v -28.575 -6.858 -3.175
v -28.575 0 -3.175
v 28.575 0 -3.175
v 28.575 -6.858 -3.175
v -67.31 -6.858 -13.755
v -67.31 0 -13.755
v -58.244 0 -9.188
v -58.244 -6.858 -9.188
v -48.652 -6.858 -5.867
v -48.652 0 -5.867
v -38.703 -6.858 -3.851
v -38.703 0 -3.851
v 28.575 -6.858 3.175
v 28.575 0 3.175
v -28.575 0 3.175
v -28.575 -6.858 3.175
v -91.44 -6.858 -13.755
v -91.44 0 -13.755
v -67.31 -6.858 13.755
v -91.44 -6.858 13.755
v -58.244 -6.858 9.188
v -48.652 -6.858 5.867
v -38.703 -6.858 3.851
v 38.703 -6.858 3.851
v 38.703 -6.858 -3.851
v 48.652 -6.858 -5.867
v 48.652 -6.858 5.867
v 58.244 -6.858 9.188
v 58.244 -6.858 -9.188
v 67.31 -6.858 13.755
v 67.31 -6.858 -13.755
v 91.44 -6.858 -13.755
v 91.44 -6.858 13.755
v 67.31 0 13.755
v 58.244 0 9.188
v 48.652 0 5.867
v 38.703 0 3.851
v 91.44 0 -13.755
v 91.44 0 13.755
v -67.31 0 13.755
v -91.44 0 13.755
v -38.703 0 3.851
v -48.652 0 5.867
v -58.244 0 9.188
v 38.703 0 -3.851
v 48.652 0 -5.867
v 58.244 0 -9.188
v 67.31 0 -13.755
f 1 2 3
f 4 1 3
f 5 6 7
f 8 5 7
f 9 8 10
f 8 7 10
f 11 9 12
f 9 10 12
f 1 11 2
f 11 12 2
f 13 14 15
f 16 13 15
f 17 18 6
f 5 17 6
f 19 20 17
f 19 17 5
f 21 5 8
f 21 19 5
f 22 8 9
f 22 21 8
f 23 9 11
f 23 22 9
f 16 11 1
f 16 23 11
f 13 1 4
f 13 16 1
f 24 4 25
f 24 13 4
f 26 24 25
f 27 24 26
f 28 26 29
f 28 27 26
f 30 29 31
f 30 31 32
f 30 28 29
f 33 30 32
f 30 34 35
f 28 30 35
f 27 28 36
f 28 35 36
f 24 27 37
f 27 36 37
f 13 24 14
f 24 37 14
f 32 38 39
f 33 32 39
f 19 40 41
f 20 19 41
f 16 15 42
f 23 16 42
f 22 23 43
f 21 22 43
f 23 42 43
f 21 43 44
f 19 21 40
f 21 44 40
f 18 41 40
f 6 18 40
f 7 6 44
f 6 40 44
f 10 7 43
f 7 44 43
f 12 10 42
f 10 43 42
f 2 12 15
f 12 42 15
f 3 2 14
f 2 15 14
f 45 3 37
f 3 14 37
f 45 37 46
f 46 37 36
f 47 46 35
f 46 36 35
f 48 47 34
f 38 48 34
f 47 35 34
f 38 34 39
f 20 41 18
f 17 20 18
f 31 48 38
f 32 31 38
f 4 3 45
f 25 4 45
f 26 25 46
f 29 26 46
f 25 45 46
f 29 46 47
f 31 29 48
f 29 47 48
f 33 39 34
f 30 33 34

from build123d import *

# Parameters (mm, degrees)
F1_DEPTH = 6.858


with BuildPart() as f1:
    # F0 (on Front) → F1 (new body)
    with BuildSketch(Plane.XZ):
        with BuildLine():
            Line((28.575, 3.175), (0, 3.175))
            Line((0, 3.175), (-28.575, 3.175))
            ThreePointArc((-28.575, 3.175), (-48.6519, 5.867462), (-67.31, 13.754578))
            Line((-67.31, 13.754578), (-91.44, 13.754578))
            Line((-91.44, 13.754578), (-91.44, -13.754578))
            Line((-91.44, -13.754578), (-67.31, -13.754578))
            ThreePointArc((-67.31, -13.754578), (-48.6519, -5.867462), (-28.575, -3.175))
            Line((-28.575, -3.175), (0, -3.175))
            Line((0, -3.175), (28.575, -3.175))
            ThreePointArc((28.575, -3.175), (48.6519, -5.867462), (67.31, -13.754578))
            Line((67.31, -13.754578), (91.44, -13.754578))
            Line((91.44, -13.754578), (91.44, 13.754578))
            Line((91.44, 13.754578), (67.31, 13.754578))
            ThreePointArc((67.31, 13.754578), (48.6519, 5.867462), (28.575, 3.175))
        make_face()
    extrude(amount=F1_DEPTH)


solid = f1.part
